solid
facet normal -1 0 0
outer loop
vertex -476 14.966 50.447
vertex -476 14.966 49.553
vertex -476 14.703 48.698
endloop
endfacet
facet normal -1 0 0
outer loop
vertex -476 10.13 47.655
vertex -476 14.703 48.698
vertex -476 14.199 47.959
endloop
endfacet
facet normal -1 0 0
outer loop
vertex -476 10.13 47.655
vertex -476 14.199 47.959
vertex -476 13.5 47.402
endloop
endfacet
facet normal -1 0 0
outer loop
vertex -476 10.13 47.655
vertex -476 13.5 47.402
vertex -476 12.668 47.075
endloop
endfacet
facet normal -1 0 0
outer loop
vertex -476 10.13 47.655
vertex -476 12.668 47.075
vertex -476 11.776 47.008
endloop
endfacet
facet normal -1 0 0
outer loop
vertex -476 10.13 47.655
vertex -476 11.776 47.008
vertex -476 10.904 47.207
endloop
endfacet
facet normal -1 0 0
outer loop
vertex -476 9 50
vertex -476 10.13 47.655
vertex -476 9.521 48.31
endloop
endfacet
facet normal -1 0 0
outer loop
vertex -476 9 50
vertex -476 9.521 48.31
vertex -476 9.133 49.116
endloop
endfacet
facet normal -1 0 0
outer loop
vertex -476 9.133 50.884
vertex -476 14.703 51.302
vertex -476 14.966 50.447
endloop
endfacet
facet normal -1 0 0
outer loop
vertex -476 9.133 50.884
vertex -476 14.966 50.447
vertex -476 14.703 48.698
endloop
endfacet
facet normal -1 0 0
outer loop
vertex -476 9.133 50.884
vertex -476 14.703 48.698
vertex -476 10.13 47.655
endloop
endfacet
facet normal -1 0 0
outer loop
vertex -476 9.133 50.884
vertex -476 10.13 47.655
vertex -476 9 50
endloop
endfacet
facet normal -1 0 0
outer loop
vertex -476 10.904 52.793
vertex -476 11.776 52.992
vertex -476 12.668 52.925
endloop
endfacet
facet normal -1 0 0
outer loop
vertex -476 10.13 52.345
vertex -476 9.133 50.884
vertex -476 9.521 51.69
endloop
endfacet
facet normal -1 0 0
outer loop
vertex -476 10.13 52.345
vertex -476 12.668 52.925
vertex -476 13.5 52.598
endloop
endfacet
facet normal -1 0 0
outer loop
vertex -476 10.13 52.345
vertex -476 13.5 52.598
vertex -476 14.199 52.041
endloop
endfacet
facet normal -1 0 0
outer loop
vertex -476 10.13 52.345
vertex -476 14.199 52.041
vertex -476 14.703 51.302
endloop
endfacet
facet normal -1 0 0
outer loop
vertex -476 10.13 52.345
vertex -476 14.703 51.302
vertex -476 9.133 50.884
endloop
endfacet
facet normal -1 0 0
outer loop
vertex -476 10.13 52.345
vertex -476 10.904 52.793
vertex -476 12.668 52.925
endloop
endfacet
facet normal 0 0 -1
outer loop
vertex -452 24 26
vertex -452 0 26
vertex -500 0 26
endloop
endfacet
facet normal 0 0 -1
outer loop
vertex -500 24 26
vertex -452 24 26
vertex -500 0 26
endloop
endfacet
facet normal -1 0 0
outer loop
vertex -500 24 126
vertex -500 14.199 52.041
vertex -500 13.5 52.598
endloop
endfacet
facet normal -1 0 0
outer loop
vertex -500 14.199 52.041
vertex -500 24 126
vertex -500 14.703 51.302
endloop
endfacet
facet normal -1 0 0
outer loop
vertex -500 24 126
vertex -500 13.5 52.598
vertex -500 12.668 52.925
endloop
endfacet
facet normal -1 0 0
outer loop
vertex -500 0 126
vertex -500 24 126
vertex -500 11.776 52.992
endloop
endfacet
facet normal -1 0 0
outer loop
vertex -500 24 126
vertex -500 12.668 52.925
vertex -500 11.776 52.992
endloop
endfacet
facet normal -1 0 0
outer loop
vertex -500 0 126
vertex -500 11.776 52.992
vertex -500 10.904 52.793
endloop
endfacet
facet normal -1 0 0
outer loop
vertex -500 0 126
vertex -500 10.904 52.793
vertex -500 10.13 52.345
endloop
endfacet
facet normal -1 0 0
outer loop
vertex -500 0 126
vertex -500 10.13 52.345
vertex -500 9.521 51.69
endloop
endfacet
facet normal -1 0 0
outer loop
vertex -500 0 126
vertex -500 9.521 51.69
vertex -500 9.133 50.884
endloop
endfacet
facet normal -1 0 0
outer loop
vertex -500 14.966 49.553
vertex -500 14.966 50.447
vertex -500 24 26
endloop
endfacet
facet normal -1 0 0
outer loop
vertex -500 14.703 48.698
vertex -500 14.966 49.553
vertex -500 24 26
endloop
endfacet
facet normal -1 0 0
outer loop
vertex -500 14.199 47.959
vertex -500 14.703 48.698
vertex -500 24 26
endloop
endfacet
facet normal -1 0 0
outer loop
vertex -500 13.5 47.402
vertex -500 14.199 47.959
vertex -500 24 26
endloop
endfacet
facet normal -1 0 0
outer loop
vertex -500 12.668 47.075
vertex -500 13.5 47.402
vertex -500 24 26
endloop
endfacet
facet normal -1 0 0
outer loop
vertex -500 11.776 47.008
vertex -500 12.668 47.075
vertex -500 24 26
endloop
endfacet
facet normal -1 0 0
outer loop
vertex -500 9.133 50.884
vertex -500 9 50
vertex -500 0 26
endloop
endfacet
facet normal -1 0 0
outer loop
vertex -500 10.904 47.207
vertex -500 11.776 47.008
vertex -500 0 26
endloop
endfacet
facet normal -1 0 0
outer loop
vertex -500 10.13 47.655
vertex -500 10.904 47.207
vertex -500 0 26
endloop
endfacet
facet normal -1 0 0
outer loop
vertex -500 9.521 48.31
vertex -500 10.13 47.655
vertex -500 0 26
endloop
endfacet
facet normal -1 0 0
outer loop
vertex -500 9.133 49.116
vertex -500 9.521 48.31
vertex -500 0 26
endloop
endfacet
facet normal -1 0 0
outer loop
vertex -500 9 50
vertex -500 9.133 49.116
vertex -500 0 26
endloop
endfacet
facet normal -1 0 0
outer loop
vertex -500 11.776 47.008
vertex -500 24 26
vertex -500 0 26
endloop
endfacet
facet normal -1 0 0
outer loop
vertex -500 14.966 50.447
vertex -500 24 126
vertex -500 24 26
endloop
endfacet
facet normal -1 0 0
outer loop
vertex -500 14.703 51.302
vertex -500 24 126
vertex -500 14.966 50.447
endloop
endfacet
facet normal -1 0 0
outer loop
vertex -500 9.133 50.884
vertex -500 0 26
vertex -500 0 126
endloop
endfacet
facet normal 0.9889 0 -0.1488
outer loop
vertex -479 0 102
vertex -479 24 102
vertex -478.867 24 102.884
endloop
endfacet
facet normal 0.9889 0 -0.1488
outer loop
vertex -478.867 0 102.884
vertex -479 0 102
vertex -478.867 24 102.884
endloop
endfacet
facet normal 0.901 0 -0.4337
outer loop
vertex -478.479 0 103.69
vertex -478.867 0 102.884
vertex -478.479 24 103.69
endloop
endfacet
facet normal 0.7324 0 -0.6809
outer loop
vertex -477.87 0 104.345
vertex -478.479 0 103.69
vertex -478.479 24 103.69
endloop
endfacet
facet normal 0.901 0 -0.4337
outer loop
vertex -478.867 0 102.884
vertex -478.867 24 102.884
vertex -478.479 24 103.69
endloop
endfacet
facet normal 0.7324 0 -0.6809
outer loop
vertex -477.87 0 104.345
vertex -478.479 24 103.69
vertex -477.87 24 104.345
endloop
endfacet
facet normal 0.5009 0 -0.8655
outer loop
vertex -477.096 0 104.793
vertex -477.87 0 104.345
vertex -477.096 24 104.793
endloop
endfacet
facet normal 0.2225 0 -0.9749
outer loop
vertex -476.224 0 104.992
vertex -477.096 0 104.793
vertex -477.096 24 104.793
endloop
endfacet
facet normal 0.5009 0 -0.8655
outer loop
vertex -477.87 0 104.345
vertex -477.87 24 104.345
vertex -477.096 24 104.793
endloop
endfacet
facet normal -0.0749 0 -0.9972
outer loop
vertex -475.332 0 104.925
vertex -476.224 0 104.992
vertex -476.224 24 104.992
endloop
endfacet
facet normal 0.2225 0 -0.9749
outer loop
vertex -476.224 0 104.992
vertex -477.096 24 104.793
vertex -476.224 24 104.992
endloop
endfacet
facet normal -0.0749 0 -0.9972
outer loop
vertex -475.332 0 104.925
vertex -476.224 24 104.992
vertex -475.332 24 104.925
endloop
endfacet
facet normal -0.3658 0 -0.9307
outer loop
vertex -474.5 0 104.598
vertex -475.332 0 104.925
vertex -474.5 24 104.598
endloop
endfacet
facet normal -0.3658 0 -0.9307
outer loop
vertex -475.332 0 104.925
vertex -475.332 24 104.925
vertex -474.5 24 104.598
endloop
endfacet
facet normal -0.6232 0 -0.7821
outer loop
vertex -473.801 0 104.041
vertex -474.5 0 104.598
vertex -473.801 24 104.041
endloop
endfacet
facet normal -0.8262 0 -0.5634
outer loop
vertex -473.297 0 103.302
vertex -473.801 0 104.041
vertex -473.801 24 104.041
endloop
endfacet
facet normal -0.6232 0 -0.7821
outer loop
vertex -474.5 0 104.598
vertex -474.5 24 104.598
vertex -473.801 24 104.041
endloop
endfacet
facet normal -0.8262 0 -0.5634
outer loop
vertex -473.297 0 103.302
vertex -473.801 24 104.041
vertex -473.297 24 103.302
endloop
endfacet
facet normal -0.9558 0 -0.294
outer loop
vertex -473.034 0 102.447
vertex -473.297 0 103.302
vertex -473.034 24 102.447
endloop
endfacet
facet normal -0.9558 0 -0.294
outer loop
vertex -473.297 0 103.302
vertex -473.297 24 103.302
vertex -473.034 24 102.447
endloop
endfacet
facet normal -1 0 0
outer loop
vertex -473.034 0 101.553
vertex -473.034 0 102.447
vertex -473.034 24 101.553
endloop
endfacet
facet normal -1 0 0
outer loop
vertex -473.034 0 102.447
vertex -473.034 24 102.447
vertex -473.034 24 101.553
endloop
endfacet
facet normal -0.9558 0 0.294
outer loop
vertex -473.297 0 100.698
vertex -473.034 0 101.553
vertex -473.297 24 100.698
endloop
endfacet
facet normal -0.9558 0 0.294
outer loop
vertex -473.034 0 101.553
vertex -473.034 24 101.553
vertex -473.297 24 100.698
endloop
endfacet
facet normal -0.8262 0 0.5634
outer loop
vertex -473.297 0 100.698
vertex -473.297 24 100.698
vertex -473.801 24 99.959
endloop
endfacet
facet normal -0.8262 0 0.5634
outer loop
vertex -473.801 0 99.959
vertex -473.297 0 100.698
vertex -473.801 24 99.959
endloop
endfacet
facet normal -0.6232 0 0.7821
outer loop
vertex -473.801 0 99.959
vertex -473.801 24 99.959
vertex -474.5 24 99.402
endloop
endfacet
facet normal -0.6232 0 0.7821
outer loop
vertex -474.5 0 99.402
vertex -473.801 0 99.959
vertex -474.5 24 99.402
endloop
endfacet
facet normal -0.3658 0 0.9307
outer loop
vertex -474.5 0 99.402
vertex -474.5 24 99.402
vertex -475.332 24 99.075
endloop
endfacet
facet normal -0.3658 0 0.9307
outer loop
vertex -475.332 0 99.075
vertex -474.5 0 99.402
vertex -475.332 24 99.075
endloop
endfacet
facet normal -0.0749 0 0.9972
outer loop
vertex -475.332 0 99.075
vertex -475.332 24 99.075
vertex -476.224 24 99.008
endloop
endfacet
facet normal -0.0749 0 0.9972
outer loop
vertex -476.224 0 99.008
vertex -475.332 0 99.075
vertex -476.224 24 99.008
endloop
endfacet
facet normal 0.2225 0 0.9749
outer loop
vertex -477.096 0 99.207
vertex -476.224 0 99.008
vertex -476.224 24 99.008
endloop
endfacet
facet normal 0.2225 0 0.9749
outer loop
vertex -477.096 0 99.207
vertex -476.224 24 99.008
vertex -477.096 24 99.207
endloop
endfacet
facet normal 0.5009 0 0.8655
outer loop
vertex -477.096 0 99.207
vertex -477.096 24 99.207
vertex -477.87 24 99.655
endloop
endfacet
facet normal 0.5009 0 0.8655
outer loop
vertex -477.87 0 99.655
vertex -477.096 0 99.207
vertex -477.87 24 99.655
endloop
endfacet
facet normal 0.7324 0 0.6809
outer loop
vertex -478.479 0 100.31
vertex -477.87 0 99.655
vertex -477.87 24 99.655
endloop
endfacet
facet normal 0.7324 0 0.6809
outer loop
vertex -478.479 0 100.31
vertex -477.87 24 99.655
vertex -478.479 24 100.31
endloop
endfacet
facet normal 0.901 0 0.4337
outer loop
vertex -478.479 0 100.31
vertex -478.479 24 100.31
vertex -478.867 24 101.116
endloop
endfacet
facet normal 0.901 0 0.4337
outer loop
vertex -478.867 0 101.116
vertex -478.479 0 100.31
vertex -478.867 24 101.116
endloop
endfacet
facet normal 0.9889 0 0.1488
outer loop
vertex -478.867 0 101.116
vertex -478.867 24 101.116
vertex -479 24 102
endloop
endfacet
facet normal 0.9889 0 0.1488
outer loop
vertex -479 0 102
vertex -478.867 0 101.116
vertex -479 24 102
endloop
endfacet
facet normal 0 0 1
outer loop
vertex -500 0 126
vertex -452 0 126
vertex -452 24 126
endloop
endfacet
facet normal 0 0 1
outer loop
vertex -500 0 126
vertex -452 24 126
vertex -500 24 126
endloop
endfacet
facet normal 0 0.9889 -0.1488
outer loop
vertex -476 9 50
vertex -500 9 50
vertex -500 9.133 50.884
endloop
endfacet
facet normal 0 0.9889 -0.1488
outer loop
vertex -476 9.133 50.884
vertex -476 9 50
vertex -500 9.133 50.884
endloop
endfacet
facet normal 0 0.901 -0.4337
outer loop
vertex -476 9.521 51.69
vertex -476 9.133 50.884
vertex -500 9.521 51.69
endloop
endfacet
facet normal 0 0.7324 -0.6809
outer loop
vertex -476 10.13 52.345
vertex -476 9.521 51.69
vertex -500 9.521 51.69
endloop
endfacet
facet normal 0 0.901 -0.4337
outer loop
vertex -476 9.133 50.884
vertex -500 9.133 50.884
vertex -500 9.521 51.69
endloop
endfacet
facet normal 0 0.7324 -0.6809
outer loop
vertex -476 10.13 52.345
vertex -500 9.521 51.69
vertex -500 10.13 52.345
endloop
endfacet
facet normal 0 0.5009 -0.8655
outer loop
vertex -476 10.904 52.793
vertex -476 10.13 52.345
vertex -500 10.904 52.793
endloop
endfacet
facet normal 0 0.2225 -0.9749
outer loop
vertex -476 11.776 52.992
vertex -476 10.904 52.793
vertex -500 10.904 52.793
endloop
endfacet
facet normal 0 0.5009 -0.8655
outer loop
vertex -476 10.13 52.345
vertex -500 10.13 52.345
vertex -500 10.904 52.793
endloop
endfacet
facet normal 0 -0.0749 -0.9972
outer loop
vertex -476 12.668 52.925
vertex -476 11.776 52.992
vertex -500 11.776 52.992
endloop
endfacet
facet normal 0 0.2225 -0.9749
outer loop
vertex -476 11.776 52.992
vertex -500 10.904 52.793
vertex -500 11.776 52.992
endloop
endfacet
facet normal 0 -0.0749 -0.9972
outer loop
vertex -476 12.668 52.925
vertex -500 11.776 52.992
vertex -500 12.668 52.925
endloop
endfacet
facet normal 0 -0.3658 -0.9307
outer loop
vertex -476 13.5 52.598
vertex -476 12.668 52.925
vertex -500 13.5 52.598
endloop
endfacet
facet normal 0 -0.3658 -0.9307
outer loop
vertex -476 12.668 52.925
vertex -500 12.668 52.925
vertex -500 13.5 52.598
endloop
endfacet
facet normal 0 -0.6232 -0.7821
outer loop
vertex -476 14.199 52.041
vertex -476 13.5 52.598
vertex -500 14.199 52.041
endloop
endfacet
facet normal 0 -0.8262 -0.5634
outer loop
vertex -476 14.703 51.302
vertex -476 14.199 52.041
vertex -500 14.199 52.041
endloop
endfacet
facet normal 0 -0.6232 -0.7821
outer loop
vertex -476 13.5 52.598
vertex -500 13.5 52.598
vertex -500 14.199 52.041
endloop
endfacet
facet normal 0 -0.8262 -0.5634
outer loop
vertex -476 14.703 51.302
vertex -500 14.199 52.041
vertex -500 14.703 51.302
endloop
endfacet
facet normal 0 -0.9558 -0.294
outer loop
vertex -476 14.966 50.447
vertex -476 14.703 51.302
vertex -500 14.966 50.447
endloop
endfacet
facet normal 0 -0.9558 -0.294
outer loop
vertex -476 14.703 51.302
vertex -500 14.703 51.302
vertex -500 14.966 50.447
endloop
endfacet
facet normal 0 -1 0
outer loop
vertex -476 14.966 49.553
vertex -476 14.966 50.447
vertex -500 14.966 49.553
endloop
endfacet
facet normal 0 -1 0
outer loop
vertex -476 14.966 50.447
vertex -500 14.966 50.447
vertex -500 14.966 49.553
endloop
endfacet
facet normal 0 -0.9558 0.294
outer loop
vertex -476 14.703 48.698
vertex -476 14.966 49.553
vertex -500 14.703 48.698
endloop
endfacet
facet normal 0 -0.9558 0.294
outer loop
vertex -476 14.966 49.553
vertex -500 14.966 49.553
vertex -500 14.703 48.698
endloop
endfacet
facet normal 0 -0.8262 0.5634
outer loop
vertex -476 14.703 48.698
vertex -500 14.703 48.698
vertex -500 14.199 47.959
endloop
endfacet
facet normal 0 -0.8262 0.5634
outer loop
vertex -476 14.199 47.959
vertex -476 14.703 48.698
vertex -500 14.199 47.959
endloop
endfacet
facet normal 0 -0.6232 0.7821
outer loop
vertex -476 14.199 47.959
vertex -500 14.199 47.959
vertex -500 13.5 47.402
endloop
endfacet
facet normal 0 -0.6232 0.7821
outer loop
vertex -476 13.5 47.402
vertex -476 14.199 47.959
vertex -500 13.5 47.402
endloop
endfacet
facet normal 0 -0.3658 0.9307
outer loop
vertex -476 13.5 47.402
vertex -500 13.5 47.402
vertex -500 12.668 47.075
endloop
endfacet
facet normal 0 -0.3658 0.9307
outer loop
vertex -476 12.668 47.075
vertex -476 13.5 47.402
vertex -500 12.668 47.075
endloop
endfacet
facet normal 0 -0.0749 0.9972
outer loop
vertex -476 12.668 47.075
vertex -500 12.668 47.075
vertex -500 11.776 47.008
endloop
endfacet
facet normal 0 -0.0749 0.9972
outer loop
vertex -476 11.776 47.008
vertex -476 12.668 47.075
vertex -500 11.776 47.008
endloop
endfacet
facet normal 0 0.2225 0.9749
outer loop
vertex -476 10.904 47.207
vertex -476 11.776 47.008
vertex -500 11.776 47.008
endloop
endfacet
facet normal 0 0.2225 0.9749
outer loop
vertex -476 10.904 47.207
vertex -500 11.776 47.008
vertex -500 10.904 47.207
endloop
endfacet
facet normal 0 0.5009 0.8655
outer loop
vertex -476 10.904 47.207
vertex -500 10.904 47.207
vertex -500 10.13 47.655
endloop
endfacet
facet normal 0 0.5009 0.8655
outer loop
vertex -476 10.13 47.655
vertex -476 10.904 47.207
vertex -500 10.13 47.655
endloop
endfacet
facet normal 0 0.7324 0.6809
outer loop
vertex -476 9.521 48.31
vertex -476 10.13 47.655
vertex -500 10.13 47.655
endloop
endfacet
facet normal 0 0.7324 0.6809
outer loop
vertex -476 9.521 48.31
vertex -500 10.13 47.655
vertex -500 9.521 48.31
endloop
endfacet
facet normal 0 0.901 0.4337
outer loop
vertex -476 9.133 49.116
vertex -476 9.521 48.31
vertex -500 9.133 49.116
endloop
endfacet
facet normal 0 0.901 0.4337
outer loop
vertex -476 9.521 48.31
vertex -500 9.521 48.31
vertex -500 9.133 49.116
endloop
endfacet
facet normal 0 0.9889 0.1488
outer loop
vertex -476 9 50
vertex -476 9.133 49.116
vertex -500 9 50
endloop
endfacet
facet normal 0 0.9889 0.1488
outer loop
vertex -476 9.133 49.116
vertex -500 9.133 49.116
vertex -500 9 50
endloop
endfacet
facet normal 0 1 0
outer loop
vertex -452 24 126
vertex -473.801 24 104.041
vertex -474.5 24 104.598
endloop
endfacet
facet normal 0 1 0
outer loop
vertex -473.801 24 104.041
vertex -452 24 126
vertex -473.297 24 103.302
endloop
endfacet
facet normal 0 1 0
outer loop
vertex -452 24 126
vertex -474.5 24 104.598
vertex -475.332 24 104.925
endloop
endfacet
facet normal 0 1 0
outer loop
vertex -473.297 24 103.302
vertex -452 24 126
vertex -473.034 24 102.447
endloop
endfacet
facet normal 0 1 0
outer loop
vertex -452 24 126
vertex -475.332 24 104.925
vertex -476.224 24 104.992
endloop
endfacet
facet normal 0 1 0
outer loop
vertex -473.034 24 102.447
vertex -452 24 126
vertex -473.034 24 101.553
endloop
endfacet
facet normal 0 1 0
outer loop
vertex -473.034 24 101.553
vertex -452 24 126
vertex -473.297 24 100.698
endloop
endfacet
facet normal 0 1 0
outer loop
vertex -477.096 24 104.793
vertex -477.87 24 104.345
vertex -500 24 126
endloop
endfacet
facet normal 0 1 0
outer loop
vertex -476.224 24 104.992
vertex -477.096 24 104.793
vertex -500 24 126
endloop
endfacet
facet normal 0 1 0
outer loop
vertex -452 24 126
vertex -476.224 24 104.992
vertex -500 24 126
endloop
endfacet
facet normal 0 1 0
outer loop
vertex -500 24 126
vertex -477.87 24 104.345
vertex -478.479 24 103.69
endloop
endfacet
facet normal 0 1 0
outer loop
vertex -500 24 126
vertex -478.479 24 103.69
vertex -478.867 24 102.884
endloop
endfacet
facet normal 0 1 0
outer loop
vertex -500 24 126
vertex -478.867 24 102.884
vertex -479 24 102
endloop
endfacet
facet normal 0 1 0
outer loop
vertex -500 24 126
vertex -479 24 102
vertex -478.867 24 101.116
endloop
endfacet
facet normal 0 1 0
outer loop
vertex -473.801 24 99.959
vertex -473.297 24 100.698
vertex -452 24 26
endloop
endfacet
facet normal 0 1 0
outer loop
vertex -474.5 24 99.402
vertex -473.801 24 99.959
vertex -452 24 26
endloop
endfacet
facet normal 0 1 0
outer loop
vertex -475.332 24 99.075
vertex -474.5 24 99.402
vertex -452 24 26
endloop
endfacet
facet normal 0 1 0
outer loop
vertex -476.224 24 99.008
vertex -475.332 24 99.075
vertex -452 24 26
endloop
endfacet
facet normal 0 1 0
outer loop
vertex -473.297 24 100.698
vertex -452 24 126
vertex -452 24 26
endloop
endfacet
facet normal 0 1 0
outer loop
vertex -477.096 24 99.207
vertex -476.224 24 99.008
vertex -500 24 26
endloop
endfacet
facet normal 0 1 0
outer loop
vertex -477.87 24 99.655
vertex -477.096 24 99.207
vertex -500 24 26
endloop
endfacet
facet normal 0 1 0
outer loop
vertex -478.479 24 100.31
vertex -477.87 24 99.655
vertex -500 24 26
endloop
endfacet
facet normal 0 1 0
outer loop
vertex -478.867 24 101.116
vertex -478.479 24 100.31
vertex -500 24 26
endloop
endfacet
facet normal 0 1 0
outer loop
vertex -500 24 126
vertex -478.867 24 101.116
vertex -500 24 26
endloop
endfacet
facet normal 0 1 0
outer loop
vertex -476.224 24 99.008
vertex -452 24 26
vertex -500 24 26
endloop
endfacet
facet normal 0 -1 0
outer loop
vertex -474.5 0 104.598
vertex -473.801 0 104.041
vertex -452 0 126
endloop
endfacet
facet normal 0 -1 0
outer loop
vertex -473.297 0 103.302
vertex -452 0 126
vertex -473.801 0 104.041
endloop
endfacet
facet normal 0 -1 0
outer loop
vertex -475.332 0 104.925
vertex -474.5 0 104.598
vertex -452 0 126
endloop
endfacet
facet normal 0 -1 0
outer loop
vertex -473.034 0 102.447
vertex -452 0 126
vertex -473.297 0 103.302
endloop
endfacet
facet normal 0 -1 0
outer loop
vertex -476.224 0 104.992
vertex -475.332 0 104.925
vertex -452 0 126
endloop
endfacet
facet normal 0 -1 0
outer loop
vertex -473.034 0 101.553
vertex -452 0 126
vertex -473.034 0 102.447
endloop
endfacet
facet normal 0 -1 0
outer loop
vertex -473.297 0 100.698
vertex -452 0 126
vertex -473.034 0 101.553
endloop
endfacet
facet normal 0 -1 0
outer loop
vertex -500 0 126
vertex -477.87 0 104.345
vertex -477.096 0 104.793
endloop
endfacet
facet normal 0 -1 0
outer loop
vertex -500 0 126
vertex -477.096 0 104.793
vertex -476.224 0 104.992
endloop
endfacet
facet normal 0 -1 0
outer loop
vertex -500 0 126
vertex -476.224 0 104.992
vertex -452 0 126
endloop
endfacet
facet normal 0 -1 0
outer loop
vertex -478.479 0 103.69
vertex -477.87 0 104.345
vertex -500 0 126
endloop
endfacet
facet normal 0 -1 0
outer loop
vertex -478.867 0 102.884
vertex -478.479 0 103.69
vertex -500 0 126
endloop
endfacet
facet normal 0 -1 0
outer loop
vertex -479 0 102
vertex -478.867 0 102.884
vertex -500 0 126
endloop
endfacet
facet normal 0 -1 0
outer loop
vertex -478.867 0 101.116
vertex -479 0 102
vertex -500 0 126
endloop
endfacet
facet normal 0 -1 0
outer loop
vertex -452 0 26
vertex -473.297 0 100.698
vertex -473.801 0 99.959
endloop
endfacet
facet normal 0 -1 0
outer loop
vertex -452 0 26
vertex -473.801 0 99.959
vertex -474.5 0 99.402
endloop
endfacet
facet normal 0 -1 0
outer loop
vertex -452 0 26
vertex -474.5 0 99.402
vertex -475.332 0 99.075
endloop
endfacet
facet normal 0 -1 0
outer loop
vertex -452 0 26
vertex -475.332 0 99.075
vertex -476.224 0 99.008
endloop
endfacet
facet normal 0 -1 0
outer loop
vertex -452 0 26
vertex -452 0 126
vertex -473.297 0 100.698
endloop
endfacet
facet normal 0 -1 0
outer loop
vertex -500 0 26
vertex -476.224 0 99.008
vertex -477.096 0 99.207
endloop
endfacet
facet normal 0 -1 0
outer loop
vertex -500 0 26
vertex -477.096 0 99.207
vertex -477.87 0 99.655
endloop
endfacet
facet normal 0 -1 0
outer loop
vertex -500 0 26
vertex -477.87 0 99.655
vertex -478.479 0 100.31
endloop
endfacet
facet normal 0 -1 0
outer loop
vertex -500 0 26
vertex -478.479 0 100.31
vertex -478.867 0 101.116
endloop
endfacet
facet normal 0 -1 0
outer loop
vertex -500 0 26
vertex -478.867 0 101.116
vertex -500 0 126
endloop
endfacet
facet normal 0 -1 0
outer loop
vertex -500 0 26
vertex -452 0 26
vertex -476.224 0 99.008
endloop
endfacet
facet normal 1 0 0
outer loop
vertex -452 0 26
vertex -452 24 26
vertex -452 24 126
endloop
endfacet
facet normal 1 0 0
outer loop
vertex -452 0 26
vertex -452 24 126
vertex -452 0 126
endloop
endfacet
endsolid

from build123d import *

# Parameters (mm, degrees)
SKETCH071_W             = 48
SKETCH071_H             = 24
PAD039_DEPTH            = 100
SKETCH069_R             = 3
POCKET031_DEPTH         = 24
SKETCH070_R             = 3
POCKET030_DEPTH         = 24.001
BODY045_PLACEMENT_ANGLE = 180


with BuildPart() as part:
    # Sketch071 → Pad039 (new body)
    with BuildSketch(Plane.XY):
        with Locations((24, 12)):
            Rectangle(SKETCH071_W, SKETCH071_H)
    extrude(amount=PAD039_DEPTH)

    # Sketch069 (on Face2 of Pad039) → Pocket031 (cut)
    with BuildSketch(Plane.YZ.offset(48)):
        with Locations((12, 24)):
            Circle(SKETCH069_R)
    extrude(amount=-POCKET031_DEPTH, mode=Mode.SUBTRACT)

    # Sketch070 (on Face1 of Pocket031) → Pocket030 (cut, through all)
    with BuildSketch(Plane.XZ):
        with Locations((24, 76)):
            Circle(SKETCH070_R)
    extrude(amount=-POCKET030_DEPTH, mode=Mode.SUBTRACT)


with BuildPart() as part_1:
    # Body045 placement: moved
    add(part.part.moved(Location((-452, 24, 26))).rotate(Axis((-452, 24, 26), (0, 0, 1)), BODY045_PLACEMENT_ANGLE))


solid = part_1.part
